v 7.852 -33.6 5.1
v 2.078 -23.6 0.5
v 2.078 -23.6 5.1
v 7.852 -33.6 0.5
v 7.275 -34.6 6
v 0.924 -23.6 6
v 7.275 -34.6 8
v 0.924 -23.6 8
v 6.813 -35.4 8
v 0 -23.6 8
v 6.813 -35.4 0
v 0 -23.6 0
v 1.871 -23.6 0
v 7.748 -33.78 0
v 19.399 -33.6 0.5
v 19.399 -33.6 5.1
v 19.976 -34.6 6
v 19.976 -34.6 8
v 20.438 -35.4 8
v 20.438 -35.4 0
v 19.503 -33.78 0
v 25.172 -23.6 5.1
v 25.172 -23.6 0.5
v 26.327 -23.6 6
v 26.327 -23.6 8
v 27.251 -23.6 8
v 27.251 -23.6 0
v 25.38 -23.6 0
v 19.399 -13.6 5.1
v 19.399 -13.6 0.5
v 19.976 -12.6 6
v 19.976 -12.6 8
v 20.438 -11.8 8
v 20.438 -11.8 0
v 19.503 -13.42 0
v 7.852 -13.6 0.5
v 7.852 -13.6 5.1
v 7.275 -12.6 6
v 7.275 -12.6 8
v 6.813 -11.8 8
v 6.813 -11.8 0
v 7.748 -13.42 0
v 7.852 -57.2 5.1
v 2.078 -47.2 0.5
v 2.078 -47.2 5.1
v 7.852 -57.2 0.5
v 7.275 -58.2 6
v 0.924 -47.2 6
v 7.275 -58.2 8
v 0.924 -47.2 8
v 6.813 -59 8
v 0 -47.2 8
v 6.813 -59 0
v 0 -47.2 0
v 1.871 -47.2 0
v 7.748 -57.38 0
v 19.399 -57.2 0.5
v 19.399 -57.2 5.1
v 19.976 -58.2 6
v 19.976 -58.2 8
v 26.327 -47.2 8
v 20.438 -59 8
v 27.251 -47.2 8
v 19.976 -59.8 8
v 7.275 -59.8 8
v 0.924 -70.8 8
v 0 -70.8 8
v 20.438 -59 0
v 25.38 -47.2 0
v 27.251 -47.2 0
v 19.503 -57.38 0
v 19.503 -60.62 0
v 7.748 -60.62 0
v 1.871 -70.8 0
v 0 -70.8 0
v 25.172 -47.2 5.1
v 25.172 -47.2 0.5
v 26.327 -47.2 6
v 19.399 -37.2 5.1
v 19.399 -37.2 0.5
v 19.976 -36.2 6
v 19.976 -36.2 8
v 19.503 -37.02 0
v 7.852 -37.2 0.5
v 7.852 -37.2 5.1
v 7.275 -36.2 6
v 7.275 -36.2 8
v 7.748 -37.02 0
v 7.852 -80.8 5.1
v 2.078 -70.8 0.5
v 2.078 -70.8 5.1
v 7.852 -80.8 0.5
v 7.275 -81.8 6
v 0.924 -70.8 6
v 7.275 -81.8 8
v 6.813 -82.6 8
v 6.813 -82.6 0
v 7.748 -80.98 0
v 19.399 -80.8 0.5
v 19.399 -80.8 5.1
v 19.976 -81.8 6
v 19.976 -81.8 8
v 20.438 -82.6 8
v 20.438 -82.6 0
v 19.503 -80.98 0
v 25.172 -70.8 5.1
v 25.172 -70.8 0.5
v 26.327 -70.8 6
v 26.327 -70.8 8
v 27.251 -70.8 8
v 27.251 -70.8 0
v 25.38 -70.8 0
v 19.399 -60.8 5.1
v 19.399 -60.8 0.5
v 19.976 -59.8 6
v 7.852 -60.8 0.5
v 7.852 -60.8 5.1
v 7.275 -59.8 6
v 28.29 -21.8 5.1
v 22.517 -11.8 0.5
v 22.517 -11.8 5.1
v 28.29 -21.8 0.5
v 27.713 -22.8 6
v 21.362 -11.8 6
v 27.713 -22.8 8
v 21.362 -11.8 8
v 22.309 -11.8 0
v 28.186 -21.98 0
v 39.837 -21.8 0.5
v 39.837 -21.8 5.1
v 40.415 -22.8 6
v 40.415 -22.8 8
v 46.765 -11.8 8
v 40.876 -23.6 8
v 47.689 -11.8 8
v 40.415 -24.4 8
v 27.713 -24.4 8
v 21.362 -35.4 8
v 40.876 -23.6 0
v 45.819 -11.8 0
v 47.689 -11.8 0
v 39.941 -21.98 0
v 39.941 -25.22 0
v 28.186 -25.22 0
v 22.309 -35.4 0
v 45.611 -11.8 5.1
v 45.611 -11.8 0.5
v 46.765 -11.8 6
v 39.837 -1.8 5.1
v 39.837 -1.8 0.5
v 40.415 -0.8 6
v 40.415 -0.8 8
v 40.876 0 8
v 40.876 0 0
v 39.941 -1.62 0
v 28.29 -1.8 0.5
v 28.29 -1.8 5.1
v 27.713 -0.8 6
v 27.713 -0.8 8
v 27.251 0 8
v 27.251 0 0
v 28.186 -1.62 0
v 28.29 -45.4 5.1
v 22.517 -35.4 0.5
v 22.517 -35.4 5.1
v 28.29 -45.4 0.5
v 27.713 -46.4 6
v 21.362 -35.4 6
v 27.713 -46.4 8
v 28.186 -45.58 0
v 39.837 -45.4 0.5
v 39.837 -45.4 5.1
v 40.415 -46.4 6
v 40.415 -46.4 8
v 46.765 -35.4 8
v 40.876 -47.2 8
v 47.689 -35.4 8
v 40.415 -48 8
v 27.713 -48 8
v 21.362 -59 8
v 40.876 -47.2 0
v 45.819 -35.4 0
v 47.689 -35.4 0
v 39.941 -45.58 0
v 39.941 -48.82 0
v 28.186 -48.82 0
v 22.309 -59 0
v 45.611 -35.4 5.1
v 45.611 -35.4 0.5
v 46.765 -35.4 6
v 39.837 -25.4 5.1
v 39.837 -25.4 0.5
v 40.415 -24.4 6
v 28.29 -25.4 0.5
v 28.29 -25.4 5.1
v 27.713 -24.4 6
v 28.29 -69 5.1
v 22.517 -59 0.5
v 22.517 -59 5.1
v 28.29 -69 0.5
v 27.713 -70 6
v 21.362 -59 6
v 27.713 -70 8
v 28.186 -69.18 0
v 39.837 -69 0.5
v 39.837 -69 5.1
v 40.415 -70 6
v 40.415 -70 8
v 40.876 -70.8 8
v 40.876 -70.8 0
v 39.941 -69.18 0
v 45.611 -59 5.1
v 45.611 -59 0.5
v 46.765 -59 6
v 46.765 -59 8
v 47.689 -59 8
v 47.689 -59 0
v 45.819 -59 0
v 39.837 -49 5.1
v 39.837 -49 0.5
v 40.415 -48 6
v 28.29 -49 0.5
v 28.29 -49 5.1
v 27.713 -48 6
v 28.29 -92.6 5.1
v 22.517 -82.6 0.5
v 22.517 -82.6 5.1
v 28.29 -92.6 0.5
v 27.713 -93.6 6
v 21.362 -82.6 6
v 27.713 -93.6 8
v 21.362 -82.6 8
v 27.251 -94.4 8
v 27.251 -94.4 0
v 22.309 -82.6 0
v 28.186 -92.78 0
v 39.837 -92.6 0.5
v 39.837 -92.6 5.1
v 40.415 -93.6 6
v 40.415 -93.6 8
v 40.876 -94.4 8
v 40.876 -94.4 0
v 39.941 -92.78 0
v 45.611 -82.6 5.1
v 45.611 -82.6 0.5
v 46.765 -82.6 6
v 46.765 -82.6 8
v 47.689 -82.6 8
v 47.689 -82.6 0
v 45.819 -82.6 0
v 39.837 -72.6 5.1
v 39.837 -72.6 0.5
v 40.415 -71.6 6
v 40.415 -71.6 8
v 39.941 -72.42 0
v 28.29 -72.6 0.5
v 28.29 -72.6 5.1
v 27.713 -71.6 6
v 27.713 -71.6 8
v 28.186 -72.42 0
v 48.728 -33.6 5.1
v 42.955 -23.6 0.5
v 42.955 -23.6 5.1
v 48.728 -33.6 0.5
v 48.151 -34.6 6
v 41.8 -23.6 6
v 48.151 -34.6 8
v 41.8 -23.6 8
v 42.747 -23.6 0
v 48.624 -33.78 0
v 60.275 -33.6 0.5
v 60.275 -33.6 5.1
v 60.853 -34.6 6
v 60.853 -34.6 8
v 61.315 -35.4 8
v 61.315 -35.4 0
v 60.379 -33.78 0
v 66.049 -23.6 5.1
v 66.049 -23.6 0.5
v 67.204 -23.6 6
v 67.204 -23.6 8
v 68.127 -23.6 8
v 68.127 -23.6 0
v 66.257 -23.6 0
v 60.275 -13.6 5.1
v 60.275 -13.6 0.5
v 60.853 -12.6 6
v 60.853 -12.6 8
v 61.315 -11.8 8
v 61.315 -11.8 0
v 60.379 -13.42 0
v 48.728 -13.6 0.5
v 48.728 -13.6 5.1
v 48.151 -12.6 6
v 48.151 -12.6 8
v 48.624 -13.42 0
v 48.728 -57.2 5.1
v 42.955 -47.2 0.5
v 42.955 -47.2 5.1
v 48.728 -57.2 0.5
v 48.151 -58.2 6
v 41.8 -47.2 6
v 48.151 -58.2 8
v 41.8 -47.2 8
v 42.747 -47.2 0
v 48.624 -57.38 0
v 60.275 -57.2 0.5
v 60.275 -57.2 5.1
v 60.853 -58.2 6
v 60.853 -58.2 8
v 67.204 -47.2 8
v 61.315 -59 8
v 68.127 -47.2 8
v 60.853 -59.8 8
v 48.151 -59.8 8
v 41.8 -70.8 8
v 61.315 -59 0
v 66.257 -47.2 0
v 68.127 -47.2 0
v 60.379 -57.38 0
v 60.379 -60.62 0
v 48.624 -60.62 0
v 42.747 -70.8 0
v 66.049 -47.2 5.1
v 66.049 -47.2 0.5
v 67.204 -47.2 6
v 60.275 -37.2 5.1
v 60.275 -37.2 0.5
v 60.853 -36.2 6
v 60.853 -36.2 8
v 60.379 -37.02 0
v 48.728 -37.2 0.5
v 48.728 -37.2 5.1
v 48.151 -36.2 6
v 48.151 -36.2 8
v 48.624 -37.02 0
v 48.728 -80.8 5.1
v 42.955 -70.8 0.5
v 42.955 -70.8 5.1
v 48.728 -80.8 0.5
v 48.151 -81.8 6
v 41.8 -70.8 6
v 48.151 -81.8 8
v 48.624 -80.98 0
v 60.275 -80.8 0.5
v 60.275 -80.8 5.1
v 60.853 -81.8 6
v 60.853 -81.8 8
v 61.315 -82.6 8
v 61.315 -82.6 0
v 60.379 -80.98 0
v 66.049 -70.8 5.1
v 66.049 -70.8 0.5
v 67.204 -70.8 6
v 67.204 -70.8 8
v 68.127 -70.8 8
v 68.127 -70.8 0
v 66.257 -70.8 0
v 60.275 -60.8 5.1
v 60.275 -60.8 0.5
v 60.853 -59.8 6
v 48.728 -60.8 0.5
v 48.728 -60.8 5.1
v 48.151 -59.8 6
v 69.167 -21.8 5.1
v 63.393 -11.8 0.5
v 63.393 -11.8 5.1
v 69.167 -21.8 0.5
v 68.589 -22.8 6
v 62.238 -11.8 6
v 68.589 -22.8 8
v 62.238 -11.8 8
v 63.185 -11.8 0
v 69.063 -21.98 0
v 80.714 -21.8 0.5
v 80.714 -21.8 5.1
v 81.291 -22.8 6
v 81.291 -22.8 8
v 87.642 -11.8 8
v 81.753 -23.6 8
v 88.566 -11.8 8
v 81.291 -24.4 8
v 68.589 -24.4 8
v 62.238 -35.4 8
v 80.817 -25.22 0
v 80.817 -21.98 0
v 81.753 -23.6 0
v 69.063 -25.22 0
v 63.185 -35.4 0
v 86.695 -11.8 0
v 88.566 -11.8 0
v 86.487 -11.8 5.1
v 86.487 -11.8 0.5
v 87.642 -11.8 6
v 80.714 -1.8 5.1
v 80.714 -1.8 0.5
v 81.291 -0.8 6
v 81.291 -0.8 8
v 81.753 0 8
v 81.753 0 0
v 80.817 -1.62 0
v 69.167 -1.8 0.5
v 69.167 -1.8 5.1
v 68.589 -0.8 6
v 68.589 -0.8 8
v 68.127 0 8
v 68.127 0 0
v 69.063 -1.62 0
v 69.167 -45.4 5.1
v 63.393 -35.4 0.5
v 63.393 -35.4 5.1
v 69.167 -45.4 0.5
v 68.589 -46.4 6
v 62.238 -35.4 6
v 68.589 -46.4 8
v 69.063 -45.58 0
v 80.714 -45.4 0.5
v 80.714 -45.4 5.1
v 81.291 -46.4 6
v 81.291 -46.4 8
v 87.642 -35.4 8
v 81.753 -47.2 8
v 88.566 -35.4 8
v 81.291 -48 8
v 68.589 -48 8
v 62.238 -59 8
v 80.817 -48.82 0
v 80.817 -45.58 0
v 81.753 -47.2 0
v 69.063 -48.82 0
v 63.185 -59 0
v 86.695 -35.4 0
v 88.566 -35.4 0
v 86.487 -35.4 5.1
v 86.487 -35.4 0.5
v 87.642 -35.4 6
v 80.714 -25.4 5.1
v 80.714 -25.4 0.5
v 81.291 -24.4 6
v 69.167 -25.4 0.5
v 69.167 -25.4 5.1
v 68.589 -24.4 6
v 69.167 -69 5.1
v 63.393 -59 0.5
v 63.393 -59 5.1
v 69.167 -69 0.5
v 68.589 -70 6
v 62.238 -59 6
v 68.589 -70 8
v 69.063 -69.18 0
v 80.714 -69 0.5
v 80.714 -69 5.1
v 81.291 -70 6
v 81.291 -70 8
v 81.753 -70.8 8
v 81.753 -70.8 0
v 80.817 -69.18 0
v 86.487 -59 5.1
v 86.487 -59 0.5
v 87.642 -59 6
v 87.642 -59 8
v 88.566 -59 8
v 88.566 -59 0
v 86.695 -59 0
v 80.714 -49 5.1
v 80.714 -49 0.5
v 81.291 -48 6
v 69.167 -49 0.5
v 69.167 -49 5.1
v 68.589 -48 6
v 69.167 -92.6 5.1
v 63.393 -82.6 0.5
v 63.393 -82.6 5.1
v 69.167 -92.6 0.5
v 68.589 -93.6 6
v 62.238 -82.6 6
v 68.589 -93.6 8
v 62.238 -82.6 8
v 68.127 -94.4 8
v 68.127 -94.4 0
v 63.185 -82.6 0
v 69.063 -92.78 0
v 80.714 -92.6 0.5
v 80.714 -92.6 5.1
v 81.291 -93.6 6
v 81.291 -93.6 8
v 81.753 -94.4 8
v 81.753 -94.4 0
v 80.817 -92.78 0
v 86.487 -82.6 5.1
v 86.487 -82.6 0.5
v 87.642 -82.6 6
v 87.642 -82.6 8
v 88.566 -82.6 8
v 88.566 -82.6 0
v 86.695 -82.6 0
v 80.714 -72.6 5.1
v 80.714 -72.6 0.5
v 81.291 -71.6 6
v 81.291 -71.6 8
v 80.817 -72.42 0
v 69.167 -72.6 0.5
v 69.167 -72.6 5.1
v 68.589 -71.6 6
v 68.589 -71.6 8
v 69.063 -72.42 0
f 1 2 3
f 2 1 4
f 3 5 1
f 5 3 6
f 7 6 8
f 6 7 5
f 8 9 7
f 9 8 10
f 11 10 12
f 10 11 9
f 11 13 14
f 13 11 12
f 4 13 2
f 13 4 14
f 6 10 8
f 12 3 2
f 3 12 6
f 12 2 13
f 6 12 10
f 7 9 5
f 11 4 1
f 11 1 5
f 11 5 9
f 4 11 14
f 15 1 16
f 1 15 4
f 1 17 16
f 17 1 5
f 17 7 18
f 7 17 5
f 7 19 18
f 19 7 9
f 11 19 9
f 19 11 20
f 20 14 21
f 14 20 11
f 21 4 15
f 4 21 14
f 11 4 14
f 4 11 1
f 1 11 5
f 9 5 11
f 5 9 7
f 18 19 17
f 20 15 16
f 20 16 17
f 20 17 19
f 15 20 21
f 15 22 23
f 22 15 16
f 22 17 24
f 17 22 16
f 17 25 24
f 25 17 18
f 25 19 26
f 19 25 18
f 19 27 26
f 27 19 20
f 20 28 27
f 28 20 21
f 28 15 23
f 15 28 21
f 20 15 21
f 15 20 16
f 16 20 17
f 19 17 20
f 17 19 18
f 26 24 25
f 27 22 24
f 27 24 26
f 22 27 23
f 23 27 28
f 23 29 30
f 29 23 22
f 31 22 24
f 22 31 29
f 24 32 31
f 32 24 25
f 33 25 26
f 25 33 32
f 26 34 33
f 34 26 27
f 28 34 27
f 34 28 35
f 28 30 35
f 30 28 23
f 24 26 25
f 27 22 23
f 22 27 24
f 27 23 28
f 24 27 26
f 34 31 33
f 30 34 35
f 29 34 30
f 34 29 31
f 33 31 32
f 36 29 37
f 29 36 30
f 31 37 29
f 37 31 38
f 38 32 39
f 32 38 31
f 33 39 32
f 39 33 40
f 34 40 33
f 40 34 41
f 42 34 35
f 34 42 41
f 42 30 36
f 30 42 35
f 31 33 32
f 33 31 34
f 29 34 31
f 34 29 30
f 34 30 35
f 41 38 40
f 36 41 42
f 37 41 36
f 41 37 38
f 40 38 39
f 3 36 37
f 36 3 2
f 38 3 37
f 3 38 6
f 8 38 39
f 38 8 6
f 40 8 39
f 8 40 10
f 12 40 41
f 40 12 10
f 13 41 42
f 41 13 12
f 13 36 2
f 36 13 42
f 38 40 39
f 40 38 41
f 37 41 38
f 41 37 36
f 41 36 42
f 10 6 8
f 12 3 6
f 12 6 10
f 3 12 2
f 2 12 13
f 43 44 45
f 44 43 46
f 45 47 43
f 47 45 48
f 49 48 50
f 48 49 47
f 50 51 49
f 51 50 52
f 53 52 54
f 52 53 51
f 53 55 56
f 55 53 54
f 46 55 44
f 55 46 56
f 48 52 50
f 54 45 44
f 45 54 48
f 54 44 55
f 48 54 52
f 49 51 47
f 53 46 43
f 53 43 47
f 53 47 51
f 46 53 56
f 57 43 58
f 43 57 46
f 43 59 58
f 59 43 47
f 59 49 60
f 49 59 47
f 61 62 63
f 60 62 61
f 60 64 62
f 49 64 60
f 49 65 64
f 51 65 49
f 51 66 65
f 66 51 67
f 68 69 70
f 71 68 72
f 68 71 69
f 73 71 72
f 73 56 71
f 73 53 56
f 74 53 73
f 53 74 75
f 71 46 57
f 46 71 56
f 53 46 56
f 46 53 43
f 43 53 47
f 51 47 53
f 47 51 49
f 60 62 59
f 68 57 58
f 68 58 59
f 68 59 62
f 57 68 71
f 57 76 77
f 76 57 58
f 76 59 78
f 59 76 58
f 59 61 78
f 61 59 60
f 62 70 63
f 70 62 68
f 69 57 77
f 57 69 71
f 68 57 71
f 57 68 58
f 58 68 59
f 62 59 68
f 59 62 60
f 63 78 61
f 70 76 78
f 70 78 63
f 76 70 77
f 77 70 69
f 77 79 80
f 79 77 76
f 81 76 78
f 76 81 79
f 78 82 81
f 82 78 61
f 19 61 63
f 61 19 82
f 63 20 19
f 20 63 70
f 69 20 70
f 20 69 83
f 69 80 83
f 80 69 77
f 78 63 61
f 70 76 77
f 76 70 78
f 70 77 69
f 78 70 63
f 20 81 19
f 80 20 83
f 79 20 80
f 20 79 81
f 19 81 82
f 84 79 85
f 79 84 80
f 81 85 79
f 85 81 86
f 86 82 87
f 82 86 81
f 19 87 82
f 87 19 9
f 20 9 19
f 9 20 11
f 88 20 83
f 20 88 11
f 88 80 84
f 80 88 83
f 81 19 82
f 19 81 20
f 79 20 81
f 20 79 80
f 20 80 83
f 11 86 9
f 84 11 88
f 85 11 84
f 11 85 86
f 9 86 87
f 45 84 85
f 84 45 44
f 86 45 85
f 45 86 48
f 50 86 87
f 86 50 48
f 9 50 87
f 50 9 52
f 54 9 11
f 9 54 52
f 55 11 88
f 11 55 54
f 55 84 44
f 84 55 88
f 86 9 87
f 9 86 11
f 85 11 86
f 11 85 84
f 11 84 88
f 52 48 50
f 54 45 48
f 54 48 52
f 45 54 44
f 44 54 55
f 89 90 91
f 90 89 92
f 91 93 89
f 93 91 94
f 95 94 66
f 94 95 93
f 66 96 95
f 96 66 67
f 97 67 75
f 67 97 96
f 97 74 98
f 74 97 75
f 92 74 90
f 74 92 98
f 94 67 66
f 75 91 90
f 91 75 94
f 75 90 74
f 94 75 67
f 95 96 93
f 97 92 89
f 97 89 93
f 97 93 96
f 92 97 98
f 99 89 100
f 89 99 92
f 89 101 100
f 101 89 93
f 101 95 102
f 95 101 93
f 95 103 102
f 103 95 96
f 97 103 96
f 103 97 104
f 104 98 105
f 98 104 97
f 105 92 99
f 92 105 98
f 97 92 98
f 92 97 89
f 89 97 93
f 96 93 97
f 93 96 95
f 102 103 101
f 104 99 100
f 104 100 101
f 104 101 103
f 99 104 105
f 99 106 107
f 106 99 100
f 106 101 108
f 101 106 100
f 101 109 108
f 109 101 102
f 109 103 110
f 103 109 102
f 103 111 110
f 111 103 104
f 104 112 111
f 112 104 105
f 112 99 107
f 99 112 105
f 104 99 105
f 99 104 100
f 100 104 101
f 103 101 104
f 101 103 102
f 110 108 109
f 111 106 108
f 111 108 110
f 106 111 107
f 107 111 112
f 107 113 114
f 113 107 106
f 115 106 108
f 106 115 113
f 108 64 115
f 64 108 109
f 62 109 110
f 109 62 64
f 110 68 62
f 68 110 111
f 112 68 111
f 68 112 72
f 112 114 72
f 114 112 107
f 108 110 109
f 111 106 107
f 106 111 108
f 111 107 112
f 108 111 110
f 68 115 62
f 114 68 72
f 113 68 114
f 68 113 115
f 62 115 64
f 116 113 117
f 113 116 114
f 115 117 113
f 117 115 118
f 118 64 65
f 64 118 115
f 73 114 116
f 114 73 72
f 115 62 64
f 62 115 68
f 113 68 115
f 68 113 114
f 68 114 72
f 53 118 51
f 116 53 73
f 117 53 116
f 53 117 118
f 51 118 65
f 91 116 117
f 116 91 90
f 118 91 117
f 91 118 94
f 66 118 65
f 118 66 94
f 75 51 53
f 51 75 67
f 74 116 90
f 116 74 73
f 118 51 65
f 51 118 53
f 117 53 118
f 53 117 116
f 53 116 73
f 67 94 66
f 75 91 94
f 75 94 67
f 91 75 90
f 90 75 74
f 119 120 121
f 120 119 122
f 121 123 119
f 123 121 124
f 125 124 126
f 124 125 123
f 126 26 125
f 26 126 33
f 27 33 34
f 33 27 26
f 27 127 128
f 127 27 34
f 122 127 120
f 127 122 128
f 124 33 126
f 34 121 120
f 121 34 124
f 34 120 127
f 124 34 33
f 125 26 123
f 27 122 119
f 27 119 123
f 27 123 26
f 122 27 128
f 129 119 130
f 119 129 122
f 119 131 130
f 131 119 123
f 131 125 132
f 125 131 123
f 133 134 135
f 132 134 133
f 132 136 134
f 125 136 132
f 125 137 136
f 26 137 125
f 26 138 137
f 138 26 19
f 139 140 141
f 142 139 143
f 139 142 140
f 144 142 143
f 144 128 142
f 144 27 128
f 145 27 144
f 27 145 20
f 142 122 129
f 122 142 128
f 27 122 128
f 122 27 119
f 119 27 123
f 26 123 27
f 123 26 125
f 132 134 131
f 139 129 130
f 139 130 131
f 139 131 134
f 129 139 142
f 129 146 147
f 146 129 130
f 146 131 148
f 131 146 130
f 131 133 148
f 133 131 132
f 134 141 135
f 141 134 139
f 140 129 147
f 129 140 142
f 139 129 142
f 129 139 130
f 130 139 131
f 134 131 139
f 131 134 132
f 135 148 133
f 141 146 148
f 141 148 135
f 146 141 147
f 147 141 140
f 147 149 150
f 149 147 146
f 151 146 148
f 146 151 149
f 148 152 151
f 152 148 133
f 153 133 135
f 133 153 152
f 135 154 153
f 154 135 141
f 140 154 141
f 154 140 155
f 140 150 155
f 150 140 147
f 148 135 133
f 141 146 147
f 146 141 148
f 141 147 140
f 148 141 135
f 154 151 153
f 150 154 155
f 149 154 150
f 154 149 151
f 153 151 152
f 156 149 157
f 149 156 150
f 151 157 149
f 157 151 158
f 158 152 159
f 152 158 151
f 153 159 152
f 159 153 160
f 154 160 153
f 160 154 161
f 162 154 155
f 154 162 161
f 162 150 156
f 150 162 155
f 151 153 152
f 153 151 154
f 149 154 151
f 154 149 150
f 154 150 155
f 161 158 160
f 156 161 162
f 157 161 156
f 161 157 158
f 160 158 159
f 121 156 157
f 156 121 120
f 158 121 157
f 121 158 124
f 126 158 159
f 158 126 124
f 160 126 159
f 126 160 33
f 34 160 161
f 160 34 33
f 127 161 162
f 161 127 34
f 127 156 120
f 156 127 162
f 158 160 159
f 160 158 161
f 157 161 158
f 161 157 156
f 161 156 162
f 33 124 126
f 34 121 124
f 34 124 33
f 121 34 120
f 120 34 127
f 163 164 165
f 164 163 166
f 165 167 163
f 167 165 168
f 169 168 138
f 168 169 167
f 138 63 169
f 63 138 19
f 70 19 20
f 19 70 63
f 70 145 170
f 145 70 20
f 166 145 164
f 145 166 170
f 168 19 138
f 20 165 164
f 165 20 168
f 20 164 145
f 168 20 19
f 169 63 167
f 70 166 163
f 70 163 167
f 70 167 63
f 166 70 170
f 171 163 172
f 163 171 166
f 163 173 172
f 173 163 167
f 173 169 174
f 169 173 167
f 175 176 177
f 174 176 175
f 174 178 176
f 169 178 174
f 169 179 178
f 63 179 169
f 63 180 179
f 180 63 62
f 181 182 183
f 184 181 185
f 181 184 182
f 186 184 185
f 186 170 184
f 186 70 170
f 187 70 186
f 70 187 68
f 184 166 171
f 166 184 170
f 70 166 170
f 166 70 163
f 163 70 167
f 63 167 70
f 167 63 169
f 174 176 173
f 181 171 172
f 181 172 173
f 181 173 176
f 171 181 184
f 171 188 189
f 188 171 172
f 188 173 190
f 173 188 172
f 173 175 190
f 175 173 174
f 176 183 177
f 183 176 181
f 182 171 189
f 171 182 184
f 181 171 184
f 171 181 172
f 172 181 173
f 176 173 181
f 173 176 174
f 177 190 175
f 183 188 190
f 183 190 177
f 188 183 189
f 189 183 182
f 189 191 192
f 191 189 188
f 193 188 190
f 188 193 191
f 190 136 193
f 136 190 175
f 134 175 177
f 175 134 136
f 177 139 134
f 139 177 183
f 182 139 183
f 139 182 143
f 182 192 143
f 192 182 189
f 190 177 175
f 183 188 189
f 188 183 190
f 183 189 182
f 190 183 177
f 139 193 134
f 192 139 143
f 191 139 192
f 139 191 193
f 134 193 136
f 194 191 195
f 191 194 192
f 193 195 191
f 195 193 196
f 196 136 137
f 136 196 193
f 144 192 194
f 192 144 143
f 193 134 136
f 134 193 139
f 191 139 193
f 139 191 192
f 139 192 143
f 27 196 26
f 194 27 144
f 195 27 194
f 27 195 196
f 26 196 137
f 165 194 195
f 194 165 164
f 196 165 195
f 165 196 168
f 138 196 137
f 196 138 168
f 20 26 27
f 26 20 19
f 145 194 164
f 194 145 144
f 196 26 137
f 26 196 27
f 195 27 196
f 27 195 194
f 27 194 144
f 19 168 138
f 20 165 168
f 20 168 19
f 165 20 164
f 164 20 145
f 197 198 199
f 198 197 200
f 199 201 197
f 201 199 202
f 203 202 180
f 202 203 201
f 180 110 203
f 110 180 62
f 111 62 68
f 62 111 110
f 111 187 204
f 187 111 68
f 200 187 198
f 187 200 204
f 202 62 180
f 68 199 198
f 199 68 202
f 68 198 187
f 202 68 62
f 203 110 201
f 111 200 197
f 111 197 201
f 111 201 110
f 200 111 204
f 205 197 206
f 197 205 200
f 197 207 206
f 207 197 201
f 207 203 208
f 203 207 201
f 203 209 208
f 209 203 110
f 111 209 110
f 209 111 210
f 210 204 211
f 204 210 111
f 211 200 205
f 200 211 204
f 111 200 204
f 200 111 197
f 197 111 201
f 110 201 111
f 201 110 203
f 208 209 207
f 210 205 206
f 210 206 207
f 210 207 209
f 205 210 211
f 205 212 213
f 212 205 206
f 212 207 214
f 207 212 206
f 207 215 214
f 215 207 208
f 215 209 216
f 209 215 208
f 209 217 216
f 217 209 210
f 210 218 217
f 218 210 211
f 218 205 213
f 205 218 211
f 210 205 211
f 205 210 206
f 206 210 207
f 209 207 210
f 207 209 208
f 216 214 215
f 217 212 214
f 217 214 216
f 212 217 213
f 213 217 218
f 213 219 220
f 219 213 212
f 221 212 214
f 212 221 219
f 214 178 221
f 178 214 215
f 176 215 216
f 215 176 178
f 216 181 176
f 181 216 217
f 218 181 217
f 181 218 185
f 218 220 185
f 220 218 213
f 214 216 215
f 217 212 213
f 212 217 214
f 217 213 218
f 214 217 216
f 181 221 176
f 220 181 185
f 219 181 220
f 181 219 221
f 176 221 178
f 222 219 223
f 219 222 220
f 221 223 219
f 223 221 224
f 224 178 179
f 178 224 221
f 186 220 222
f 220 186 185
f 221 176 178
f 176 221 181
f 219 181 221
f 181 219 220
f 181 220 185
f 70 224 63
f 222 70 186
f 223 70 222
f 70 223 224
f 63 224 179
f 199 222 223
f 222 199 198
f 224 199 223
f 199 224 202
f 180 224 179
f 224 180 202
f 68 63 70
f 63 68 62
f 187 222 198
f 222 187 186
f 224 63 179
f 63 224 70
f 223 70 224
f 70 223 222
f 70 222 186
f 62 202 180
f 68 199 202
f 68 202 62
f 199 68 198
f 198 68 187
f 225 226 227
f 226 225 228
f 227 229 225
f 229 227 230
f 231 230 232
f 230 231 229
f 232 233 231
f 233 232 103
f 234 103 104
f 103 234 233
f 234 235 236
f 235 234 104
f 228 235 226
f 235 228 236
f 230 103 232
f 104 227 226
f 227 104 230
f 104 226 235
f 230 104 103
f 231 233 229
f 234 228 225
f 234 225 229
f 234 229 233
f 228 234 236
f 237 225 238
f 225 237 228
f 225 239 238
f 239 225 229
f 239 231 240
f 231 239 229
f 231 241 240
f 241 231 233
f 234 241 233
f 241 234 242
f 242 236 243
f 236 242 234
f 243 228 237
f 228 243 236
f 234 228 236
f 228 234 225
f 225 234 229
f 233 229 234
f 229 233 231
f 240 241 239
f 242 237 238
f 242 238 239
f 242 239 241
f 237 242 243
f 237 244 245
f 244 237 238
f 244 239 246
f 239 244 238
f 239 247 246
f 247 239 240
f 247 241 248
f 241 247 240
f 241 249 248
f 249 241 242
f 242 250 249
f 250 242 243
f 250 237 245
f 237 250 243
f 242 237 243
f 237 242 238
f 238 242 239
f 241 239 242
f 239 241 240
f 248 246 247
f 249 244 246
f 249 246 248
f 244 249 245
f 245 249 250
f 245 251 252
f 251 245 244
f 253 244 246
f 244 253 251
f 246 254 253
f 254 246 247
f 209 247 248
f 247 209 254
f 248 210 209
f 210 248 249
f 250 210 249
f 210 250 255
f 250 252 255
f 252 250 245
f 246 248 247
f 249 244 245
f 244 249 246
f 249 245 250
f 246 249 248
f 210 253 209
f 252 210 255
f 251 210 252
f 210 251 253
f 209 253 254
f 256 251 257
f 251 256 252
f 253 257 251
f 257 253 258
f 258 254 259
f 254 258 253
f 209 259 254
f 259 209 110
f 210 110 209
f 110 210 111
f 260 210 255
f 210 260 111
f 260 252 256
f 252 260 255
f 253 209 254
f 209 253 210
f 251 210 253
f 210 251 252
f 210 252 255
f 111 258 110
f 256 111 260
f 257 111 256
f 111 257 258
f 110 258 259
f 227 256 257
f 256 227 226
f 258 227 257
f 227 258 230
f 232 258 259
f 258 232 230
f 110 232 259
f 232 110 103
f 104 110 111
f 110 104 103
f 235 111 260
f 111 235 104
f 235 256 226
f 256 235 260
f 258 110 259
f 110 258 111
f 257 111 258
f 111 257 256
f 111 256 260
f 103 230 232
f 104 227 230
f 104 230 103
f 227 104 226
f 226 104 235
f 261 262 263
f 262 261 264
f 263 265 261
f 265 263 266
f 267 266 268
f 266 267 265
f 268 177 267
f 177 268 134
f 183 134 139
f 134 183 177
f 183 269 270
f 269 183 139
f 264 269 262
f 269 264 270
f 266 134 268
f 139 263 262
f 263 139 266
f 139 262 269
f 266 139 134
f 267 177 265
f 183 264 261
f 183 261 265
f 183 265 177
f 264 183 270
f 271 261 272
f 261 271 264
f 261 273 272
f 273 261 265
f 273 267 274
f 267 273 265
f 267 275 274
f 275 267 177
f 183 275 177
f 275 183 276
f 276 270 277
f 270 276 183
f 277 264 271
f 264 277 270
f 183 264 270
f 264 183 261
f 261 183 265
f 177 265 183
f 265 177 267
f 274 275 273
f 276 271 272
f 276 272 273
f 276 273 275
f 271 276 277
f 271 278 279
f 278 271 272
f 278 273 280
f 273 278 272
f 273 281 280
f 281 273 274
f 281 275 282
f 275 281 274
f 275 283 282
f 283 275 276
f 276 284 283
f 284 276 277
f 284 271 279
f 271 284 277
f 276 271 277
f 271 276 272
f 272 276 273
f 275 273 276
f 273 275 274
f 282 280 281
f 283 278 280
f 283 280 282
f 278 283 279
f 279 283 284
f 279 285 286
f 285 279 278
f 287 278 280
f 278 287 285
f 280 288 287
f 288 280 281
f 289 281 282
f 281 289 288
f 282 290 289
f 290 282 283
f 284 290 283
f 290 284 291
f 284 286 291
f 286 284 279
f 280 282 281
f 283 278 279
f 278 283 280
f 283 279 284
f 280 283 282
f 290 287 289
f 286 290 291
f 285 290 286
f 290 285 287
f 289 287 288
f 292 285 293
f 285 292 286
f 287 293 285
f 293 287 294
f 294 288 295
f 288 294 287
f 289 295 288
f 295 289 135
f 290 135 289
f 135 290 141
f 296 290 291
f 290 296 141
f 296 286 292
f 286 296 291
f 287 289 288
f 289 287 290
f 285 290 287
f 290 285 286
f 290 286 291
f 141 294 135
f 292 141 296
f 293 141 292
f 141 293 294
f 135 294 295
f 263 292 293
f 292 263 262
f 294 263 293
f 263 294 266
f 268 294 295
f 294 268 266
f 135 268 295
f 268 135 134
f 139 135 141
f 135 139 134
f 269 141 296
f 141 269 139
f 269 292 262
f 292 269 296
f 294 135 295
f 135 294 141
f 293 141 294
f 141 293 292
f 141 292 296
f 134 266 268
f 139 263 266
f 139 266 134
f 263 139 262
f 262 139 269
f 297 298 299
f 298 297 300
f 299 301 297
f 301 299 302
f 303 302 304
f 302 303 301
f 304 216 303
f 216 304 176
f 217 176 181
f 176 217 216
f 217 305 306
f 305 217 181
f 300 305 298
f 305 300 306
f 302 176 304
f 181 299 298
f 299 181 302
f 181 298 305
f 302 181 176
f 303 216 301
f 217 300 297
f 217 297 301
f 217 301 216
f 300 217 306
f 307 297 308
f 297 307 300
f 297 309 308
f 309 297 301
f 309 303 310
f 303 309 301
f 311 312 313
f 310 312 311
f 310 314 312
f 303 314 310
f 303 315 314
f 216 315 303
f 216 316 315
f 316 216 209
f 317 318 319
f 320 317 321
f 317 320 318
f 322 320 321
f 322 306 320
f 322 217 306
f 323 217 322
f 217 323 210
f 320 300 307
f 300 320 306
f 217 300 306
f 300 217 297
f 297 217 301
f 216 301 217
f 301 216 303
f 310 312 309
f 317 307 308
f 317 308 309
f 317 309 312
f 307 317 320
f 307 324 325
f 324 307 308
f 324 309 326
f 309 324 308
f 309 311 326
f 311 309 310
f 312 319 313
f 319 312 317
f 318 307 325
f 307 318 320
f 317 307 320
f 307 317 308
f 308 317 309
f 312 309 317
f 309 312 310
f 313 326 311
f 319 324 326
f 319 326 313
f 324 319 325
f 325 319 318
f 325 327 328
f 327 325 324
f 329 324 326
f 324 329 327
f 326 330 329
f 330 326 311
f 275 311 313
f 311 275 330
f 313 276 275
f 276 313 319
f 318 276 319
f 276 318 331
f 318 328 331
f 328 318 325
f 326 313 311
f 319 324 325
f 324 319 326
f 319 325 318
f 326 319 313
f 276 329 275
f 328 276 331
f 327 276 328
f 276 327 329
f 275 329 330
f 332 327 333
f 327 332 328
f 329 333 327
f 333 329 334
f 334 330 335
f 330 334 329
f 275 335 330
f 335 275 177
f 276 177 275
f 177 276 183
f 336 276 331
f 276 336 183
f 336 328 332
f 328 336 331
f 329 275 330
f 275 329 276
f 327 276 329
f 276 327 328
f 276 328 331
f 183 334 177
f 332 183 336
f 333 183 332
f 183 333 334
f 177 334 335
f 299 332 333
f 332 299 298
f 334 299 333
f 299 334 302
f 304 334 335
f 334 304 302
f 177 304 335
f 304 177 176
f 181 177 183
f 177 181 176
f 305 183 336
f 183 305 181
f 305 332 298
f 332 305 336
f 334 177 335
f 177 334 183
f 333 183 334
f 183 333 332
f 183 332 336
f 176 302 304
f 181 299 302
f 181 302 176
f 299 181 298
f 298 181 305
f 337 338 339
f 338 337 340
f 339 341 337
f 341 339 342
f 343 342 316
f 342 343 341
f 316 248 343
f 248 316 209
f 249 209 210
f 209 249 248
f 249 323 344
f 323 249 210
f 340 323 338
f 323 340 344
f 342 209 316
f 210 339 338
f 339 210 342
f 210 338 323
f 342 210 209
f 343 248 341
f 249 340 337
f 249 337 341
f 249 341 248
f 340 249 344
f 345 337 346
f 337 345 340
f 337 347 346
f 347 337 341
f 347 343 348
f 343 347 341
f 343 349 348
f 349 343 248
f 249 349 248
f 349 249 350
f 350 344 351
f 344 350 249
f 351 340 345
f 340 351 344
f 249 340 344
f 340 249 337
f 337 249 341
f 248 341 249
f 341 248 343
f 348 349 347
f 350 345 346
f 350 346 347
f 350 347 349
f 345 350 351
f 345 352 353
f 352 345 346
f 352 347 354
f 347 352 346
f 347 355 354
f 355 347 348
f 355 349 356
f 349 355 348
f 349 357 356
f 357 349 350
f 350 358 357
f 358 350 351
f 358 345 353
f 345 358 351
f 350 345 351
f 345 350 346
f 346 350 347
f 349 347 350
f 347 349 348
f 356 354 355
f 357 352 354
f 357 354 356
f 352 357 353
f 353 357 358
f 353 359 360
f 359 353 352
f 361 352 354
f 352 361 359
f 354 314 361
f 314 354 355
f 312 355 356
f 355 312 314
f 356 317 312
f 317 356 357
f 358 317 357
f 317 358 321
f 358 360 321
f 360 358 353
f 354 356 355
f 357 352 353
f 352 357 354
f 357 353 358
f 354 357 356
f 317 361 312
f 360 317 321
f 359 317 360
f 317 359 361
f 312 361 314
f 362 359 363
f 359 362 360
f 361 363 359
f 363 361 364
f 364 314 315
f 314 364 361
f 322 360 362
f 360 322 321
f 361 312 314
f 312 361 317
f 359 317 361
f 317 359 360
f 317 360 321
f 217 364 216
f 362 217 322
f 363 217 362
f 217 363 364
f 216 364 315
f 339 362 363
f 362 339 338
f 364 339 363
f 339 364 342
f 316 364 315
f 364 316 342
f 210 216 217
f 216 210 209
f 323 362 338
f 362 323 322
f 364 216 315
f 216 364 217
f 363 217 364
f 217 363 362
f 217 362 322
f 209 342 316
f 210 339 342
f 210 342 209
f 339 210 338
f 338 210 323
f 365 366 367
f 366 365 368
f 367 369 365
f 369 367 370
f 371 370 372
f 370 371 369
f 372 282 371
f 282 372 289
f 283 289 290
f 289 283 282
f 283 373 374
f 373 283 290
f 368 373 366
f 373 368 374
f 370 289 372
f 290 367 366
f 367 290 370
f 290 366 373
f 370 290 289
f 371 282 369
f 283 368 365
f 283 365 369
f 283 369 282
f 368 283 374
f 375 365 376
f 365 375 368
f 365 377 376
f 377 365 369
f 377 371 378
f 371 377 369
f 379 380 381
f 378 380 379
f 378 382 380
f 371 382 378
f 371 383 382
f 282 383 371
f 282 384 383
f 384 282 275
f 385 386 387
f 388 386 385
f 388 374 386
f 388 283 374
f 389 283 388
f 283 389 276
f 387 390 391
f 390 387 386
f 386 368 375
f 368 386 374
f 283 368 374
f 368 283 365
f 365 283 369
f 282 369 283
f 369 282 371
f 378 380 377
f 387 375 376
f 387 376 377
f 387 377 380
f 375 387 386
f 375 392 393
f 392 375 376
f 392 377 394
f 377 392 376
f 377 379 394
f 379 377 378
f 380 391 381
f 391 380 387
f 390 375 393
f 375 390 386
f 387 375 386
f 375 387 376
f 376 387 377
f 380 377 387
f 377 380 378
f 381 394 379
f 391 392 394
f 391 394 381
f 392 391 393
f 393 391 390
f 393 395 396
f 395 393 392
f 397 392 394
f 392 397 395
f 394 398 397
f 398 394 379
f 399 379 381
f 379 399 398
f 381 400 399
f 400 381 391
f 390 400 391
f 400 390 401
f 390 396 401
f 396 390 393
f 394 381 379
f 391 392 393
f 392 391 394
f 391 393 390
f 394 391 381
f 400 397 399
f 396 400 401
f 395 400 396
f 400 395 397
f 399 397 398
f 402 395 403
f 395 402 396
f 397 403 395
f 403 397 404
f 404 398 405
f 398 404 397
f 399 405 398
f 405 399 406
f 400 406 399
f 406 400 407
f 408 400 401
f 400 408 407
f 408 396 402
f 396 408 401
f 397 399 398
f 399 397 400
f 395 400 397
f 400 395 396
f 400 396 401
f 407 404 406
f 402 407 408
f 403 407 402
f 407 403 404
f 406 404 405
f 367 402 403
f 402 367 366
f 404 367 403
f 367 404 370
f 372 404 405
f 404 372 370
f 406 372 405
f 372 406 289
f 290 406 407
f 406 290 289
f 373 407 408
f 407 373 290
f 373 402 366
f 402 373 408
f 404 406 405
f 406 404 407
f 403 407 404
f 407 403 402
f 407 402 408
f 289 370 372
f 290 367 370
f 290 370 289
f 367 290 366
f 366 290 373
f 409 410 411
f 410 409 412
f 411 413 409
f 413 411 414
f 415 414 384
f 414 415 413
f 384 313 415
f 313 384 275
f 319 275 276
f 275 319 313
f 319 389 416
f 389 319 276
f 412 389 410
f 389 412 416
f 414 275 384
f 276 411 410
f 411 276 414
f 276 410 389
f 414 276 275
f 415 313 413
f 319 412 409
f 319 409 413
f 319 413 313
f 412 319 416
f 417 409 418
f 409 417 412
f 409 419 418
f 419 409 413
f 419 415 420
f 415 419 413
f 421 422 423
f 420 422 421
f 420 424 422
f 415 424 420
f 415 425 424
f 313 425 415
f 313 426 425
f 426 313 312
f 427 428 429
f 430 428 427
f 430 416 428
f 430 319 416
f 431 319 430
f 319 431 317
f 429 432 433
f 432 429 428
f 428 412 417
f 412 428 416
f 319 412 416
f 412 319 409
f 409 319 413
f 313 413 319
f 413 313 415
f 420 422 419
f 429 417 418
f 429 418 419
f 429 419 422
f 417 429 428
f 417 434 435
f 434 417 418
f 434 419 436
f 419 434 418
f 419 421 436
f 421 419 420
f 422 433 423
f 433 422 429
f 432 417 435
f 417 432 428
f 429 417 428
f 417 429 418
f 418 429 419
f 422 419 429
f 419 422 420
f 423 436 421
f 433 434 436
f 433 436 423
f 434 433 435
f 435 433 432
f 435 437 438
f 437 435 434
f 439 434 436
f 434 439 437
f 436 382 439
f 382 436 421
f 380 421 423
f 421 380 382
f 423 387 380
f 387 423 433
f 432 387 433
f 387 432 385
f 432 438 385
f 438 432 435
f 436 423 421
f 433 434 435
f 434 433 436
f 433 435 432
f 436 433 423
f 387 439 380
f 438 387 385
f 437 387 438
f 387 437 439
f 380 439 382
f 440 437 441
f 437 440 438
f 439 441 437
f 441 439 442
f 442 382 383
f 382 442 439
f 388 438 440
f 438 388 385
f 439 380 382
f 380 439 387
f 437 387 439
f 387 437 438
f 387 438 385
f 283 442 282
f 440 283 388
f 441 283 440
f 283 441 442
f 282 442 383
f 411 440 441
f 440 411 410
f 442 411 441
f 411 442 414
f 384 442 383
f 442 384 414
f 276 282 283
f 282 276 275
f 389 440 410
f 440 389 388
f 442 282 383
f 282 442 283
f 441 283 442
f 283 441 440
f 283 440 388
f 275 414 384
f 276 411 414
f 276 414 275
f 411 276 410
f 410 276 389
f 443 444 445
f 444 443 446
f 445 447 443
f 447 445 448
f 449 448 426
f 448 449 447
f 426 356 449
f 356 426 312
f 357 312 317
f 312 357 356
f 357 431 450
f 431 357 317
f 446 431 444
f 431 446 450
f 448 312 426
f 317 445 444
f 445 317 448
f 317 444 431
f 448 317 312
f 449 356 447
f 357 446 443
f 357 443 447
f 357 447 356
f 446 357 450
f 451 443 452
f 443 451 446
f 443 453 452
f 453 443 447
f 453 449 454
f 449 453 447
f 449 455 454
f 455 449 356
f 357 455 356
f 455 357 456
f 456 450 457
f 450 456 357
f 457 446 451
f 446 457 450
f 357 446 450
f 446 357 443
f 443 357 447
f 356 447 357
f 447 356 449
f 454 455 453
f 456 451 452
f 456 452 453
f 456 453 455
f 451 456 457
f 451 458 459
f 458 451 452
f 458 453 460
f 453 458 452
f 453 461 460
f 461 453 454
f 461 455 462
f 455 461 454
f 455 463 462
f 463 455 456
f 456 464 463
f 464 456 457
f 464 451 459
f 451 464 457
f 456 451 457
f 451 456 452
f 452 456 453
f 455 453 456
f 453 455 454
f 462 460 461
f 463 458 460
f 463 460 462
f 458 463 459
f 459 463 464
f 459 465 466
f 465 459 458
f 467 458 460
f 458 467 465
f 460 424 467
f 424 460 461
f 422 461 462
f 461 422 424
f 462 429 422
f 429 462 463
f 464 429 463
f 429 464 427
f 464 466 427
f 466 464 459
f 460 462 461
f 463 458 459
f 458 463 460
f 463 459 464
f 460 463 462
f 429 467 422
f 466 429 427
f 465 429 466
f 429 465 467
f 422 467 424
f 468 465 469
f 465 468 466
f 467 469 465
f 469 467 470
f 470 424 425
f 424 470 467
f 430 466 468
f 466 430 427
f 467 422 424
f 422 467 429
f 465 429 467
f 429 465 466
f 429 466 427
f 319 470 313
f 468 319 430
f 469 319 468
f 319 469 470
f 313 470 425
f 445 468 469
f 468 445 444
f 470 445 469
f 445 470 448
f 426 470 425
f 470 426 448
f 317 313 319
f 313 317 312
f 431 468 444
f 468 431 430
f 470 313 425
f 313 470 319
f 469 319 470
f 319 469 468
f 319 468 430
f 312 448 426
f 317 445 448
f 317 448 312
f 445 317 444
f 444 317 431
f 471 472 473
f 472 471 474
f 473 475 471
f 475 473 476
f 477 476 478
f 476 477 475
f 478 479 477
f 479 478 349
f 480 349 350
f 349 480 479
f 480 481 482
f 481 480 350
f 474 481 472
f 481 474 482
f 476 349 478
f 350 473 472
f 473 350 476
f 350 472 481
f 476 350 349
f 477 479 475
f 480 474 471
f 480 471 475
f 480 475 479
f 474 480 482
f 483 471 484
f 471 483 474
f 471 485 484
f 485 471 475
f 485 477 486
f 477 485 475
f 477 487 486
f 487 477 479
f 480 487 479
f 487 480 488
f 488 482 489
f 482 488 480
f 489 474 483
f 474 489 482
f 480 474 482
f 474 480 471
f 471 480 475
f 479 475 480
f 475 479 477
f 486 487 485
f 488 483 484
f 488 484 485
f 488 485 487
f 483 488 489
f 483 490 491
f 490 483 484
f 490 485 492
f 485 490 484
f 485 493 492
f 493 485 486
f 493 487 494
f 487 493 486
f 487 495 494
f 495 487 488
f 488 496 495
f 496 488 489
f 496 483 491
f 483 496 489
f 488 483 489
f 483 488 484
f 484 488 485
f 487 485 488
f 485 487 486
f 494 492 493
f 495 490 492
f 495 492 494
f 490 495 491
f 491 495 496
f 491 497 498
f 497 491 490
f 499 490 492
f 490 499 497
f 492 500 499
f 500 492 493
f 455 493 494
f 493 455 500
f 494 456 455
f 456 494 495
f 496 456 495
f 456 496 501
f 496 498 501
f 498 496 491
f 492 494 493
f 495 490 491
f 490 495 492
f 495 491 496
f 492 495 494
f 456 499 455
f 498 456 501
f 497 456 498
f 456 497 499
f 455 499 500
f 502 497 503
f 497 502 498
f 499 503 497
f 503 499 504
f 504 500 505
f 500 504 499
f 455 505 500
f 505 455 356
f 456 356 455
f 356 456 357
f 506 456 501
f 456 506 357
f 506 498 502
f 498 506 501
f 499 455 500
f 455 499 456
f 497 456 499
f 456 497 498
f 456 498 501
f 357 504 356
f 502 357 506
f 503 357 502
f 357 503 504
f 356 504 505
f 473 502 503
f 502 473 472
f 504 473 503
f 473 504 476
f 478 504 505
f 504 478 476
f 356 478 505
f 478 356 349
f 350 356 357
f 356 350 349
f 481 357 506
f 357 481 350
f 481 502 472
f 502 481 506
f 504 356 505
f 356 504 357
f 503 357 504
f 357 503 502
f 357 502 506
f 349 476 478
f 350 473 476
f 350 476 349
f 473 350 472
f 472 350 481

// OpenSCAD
/*[ Hex unit size ]*/

//Depth of the grid
depth = 8;
//Width of the hexagon's hole (flat side to flat side)
hole_width = 20;
//Thickness of the wall forming each hexagon
wall_thickness = 1.8;

/*[ Grid size settings ]*/
max_grid_width=100;
max_grid_height=100;

/*[ Grid shape ]*/
//If checked, ignores custom column sizes and fills grid to maximum size.
fill=true;;
flip_staggering=true;
//Amount of hexagons per column. Each entry defines a one column, where the number specifies the amount of hex units that will be generated for the respective column. (Ignored if "fill" is checked)
columns=[3,5,8,6,4,3,4,5,6];
include_offsets=false;
//Optional: Offset for each column. This will ignore grid size limits.
column_offsets=[0,-2,-3,-1,0,2,4];
include_gaps=false;
//Optional: Gaps for each column. *NOTE: Change these values in the code. Seems like 2D vector parameters aren't supported by the parameter editor and are always overwritten by the defaults.
column_gaps=[[], [3,4], [4,5], [2]];

/*[ Flat edges ]*/
edge_left = false;
edge_top = false;
edge_right = false;
edge_bottom = false;


//Calculated global variables
//Hexagon dimensions
hex_inner_r = hole_width/sqrt(3); //Inner radius/side length (center to point)
hex_h=hole_width+wall_thickness*2; //Outer side to side distance
hex_s=hex_h/sqrt(3); //Outer radius/side length 
hex_d=2*hex_s; //Outer diameter (point to point)
hex_t=hex_s/2;
//Grid dimensions
max_grid_hexagons_x = fill? floor(max_grid_width/(hex_d-hex_t) +(edge_left?0.5:0) +(edge_right?0.5:0)): len(columns);
max_grid_hexagons_y = fill? floor(max_grid_height/hex_h +(edge_top?0.5:0) +(edge_bottom?0.5:0)): max(columns);
max_grid_hexagons_y_lo = fill? floor(max_grid_height/hex_h - 0.5 +(edge_top?0.5:0) +(edge_bottom?0.5:0)): (max(columns) - 0.5);
total_width = max_grid_hexagons_x * (hex_d-hex_t) + hex_t;
total_height = hex_h*max(max_grid_hexagons_y - 0.5, max_grid_hexagons_y_lo);


translate([edge_left?0:hex_s, edge_top?0:-hex_h/2, 0])
grid(columns, include_offsets?column_offsets:[], include_gaps?column_gaps:[], depth, hole_width, wall_thickness, fill);


module grid(cols, offsets, gaps, height, hole_width, wall_width, fill){    
    for(hcol = [0:fill?max_grid_hexagons_x-1:(len(cols)-1)]){
        for(hrow = [0:(fill?(max_grid_hexagons_y-1):(cols[hcol]-1))]) {
            skip = hcol<len(gaps) && len(search(hrow+1, gaps[hcol])) > 0;          
            if(!skip){
                offset_value=hcol>len(offsets)-1?0:offsets[hcol];
                
                lo = (hcol+(flip_staggering?1:0))%2;
                x = (hex_d-hex_t)*hcol;
                y = -(hex_h)*(hrow + offset_value + lo/2);                
                
                if(hcol<max_grid_hexagons_x && hrow<(lo==0?max_grid_hexagons_y:max_grid_hexagons_y_lo)){
                    left = edge_left && hcol==0;
                    top = edge_top && hrow==0 && hcol%2==(flip_staggering?1:0);
                    right = edge_right && hcol==max_grid_hexagons_x-1;
                    bottom = edge_bottom && hrow+1==(lo==0?max_grid_hexagons_y:max_grid_hexagons_y_lo) && -y+hex_h>total_height+0.001 && -y+hex_h/2<=total_height;
                    translate([x, y, 0]) halfhex(height, hex_s, wall_width, hole_width, left, top, right, bottom);
                }
            }        
        }
    }
}

module halfhex(height, radius, wall_thickness, hole_width, left, top, right, bottom){
    difference(){
        union(){
            hex(height, radius, wall_thickness, hole_width);
            if(left) translate([0, hex_h/2, 0]) wall(depth, wall_thickness, hex_h);
            if(top) translate([hex_d/2, 0, 0]) rotate([0,0,-90]) wall(depth, wall_thickness, hex_d);
            if(right) translate([0, -hex_h/2, 0]) rotate([0,0,180]) wall(depth, wall_thickness, hex_h);
            if(bottom) translate([-hex_d/2, 0, 0]) rotate([0,0,90]) wall(depth, wall_thickness, hex_d);
        }
        if(left) translate([-hex_d/2, -hex_h, 0]) cube([hex_d/2, 2*hex_h, depth]);
        if(top) translate([-hex_d/2, 0, 0]) cube([hex_d, hex_h, depth]);
        if(right) translate([0, -hex_h, 0]) cube([hex_d/2, 2*hex_h, depth]);
        if(bottom) translate([-hex_d/2, -hex_h, 0]) cube([hex_d, hex_h, depth]);
    }
}

module hex(height, radius, wall_thickness, hole_width){
    for(i=[0:5]){
        rotate([0,0,i*60+30])
        translate([-hole_width/2-wall_thickness, radius/2, 0])
        wall(height, wall_thickness, radius);
    }
}

module wall(height, wall_thickness, length){
    hmax=height;
    hmin=5.1;
    hd=2;
    tmax=wall_thickness;
    tmin=wall_thickness-1;   
    ft = 0.18;//fillet thickness
    fh = 0.5;//fillet height
    
    difference(){
        rotate([90,0,0])
            linear_extrude(length)   
            polygon([[0,0], [0,hmax], [tmin,hmax], [tmin,hmax-hd], [tmax,hmin], [tmax,fh], [tmax-ft,0]]);
        //Fillet
        rotate([0,0,-30])
            cube([4*tmax, 2*tmax, hmax]);
        mirror([0,1,0])
            translate([0,length,0])
            rotate([0,0,-30])
            cube([4*tmax, 2*tmax, hmax]);
    }
}
